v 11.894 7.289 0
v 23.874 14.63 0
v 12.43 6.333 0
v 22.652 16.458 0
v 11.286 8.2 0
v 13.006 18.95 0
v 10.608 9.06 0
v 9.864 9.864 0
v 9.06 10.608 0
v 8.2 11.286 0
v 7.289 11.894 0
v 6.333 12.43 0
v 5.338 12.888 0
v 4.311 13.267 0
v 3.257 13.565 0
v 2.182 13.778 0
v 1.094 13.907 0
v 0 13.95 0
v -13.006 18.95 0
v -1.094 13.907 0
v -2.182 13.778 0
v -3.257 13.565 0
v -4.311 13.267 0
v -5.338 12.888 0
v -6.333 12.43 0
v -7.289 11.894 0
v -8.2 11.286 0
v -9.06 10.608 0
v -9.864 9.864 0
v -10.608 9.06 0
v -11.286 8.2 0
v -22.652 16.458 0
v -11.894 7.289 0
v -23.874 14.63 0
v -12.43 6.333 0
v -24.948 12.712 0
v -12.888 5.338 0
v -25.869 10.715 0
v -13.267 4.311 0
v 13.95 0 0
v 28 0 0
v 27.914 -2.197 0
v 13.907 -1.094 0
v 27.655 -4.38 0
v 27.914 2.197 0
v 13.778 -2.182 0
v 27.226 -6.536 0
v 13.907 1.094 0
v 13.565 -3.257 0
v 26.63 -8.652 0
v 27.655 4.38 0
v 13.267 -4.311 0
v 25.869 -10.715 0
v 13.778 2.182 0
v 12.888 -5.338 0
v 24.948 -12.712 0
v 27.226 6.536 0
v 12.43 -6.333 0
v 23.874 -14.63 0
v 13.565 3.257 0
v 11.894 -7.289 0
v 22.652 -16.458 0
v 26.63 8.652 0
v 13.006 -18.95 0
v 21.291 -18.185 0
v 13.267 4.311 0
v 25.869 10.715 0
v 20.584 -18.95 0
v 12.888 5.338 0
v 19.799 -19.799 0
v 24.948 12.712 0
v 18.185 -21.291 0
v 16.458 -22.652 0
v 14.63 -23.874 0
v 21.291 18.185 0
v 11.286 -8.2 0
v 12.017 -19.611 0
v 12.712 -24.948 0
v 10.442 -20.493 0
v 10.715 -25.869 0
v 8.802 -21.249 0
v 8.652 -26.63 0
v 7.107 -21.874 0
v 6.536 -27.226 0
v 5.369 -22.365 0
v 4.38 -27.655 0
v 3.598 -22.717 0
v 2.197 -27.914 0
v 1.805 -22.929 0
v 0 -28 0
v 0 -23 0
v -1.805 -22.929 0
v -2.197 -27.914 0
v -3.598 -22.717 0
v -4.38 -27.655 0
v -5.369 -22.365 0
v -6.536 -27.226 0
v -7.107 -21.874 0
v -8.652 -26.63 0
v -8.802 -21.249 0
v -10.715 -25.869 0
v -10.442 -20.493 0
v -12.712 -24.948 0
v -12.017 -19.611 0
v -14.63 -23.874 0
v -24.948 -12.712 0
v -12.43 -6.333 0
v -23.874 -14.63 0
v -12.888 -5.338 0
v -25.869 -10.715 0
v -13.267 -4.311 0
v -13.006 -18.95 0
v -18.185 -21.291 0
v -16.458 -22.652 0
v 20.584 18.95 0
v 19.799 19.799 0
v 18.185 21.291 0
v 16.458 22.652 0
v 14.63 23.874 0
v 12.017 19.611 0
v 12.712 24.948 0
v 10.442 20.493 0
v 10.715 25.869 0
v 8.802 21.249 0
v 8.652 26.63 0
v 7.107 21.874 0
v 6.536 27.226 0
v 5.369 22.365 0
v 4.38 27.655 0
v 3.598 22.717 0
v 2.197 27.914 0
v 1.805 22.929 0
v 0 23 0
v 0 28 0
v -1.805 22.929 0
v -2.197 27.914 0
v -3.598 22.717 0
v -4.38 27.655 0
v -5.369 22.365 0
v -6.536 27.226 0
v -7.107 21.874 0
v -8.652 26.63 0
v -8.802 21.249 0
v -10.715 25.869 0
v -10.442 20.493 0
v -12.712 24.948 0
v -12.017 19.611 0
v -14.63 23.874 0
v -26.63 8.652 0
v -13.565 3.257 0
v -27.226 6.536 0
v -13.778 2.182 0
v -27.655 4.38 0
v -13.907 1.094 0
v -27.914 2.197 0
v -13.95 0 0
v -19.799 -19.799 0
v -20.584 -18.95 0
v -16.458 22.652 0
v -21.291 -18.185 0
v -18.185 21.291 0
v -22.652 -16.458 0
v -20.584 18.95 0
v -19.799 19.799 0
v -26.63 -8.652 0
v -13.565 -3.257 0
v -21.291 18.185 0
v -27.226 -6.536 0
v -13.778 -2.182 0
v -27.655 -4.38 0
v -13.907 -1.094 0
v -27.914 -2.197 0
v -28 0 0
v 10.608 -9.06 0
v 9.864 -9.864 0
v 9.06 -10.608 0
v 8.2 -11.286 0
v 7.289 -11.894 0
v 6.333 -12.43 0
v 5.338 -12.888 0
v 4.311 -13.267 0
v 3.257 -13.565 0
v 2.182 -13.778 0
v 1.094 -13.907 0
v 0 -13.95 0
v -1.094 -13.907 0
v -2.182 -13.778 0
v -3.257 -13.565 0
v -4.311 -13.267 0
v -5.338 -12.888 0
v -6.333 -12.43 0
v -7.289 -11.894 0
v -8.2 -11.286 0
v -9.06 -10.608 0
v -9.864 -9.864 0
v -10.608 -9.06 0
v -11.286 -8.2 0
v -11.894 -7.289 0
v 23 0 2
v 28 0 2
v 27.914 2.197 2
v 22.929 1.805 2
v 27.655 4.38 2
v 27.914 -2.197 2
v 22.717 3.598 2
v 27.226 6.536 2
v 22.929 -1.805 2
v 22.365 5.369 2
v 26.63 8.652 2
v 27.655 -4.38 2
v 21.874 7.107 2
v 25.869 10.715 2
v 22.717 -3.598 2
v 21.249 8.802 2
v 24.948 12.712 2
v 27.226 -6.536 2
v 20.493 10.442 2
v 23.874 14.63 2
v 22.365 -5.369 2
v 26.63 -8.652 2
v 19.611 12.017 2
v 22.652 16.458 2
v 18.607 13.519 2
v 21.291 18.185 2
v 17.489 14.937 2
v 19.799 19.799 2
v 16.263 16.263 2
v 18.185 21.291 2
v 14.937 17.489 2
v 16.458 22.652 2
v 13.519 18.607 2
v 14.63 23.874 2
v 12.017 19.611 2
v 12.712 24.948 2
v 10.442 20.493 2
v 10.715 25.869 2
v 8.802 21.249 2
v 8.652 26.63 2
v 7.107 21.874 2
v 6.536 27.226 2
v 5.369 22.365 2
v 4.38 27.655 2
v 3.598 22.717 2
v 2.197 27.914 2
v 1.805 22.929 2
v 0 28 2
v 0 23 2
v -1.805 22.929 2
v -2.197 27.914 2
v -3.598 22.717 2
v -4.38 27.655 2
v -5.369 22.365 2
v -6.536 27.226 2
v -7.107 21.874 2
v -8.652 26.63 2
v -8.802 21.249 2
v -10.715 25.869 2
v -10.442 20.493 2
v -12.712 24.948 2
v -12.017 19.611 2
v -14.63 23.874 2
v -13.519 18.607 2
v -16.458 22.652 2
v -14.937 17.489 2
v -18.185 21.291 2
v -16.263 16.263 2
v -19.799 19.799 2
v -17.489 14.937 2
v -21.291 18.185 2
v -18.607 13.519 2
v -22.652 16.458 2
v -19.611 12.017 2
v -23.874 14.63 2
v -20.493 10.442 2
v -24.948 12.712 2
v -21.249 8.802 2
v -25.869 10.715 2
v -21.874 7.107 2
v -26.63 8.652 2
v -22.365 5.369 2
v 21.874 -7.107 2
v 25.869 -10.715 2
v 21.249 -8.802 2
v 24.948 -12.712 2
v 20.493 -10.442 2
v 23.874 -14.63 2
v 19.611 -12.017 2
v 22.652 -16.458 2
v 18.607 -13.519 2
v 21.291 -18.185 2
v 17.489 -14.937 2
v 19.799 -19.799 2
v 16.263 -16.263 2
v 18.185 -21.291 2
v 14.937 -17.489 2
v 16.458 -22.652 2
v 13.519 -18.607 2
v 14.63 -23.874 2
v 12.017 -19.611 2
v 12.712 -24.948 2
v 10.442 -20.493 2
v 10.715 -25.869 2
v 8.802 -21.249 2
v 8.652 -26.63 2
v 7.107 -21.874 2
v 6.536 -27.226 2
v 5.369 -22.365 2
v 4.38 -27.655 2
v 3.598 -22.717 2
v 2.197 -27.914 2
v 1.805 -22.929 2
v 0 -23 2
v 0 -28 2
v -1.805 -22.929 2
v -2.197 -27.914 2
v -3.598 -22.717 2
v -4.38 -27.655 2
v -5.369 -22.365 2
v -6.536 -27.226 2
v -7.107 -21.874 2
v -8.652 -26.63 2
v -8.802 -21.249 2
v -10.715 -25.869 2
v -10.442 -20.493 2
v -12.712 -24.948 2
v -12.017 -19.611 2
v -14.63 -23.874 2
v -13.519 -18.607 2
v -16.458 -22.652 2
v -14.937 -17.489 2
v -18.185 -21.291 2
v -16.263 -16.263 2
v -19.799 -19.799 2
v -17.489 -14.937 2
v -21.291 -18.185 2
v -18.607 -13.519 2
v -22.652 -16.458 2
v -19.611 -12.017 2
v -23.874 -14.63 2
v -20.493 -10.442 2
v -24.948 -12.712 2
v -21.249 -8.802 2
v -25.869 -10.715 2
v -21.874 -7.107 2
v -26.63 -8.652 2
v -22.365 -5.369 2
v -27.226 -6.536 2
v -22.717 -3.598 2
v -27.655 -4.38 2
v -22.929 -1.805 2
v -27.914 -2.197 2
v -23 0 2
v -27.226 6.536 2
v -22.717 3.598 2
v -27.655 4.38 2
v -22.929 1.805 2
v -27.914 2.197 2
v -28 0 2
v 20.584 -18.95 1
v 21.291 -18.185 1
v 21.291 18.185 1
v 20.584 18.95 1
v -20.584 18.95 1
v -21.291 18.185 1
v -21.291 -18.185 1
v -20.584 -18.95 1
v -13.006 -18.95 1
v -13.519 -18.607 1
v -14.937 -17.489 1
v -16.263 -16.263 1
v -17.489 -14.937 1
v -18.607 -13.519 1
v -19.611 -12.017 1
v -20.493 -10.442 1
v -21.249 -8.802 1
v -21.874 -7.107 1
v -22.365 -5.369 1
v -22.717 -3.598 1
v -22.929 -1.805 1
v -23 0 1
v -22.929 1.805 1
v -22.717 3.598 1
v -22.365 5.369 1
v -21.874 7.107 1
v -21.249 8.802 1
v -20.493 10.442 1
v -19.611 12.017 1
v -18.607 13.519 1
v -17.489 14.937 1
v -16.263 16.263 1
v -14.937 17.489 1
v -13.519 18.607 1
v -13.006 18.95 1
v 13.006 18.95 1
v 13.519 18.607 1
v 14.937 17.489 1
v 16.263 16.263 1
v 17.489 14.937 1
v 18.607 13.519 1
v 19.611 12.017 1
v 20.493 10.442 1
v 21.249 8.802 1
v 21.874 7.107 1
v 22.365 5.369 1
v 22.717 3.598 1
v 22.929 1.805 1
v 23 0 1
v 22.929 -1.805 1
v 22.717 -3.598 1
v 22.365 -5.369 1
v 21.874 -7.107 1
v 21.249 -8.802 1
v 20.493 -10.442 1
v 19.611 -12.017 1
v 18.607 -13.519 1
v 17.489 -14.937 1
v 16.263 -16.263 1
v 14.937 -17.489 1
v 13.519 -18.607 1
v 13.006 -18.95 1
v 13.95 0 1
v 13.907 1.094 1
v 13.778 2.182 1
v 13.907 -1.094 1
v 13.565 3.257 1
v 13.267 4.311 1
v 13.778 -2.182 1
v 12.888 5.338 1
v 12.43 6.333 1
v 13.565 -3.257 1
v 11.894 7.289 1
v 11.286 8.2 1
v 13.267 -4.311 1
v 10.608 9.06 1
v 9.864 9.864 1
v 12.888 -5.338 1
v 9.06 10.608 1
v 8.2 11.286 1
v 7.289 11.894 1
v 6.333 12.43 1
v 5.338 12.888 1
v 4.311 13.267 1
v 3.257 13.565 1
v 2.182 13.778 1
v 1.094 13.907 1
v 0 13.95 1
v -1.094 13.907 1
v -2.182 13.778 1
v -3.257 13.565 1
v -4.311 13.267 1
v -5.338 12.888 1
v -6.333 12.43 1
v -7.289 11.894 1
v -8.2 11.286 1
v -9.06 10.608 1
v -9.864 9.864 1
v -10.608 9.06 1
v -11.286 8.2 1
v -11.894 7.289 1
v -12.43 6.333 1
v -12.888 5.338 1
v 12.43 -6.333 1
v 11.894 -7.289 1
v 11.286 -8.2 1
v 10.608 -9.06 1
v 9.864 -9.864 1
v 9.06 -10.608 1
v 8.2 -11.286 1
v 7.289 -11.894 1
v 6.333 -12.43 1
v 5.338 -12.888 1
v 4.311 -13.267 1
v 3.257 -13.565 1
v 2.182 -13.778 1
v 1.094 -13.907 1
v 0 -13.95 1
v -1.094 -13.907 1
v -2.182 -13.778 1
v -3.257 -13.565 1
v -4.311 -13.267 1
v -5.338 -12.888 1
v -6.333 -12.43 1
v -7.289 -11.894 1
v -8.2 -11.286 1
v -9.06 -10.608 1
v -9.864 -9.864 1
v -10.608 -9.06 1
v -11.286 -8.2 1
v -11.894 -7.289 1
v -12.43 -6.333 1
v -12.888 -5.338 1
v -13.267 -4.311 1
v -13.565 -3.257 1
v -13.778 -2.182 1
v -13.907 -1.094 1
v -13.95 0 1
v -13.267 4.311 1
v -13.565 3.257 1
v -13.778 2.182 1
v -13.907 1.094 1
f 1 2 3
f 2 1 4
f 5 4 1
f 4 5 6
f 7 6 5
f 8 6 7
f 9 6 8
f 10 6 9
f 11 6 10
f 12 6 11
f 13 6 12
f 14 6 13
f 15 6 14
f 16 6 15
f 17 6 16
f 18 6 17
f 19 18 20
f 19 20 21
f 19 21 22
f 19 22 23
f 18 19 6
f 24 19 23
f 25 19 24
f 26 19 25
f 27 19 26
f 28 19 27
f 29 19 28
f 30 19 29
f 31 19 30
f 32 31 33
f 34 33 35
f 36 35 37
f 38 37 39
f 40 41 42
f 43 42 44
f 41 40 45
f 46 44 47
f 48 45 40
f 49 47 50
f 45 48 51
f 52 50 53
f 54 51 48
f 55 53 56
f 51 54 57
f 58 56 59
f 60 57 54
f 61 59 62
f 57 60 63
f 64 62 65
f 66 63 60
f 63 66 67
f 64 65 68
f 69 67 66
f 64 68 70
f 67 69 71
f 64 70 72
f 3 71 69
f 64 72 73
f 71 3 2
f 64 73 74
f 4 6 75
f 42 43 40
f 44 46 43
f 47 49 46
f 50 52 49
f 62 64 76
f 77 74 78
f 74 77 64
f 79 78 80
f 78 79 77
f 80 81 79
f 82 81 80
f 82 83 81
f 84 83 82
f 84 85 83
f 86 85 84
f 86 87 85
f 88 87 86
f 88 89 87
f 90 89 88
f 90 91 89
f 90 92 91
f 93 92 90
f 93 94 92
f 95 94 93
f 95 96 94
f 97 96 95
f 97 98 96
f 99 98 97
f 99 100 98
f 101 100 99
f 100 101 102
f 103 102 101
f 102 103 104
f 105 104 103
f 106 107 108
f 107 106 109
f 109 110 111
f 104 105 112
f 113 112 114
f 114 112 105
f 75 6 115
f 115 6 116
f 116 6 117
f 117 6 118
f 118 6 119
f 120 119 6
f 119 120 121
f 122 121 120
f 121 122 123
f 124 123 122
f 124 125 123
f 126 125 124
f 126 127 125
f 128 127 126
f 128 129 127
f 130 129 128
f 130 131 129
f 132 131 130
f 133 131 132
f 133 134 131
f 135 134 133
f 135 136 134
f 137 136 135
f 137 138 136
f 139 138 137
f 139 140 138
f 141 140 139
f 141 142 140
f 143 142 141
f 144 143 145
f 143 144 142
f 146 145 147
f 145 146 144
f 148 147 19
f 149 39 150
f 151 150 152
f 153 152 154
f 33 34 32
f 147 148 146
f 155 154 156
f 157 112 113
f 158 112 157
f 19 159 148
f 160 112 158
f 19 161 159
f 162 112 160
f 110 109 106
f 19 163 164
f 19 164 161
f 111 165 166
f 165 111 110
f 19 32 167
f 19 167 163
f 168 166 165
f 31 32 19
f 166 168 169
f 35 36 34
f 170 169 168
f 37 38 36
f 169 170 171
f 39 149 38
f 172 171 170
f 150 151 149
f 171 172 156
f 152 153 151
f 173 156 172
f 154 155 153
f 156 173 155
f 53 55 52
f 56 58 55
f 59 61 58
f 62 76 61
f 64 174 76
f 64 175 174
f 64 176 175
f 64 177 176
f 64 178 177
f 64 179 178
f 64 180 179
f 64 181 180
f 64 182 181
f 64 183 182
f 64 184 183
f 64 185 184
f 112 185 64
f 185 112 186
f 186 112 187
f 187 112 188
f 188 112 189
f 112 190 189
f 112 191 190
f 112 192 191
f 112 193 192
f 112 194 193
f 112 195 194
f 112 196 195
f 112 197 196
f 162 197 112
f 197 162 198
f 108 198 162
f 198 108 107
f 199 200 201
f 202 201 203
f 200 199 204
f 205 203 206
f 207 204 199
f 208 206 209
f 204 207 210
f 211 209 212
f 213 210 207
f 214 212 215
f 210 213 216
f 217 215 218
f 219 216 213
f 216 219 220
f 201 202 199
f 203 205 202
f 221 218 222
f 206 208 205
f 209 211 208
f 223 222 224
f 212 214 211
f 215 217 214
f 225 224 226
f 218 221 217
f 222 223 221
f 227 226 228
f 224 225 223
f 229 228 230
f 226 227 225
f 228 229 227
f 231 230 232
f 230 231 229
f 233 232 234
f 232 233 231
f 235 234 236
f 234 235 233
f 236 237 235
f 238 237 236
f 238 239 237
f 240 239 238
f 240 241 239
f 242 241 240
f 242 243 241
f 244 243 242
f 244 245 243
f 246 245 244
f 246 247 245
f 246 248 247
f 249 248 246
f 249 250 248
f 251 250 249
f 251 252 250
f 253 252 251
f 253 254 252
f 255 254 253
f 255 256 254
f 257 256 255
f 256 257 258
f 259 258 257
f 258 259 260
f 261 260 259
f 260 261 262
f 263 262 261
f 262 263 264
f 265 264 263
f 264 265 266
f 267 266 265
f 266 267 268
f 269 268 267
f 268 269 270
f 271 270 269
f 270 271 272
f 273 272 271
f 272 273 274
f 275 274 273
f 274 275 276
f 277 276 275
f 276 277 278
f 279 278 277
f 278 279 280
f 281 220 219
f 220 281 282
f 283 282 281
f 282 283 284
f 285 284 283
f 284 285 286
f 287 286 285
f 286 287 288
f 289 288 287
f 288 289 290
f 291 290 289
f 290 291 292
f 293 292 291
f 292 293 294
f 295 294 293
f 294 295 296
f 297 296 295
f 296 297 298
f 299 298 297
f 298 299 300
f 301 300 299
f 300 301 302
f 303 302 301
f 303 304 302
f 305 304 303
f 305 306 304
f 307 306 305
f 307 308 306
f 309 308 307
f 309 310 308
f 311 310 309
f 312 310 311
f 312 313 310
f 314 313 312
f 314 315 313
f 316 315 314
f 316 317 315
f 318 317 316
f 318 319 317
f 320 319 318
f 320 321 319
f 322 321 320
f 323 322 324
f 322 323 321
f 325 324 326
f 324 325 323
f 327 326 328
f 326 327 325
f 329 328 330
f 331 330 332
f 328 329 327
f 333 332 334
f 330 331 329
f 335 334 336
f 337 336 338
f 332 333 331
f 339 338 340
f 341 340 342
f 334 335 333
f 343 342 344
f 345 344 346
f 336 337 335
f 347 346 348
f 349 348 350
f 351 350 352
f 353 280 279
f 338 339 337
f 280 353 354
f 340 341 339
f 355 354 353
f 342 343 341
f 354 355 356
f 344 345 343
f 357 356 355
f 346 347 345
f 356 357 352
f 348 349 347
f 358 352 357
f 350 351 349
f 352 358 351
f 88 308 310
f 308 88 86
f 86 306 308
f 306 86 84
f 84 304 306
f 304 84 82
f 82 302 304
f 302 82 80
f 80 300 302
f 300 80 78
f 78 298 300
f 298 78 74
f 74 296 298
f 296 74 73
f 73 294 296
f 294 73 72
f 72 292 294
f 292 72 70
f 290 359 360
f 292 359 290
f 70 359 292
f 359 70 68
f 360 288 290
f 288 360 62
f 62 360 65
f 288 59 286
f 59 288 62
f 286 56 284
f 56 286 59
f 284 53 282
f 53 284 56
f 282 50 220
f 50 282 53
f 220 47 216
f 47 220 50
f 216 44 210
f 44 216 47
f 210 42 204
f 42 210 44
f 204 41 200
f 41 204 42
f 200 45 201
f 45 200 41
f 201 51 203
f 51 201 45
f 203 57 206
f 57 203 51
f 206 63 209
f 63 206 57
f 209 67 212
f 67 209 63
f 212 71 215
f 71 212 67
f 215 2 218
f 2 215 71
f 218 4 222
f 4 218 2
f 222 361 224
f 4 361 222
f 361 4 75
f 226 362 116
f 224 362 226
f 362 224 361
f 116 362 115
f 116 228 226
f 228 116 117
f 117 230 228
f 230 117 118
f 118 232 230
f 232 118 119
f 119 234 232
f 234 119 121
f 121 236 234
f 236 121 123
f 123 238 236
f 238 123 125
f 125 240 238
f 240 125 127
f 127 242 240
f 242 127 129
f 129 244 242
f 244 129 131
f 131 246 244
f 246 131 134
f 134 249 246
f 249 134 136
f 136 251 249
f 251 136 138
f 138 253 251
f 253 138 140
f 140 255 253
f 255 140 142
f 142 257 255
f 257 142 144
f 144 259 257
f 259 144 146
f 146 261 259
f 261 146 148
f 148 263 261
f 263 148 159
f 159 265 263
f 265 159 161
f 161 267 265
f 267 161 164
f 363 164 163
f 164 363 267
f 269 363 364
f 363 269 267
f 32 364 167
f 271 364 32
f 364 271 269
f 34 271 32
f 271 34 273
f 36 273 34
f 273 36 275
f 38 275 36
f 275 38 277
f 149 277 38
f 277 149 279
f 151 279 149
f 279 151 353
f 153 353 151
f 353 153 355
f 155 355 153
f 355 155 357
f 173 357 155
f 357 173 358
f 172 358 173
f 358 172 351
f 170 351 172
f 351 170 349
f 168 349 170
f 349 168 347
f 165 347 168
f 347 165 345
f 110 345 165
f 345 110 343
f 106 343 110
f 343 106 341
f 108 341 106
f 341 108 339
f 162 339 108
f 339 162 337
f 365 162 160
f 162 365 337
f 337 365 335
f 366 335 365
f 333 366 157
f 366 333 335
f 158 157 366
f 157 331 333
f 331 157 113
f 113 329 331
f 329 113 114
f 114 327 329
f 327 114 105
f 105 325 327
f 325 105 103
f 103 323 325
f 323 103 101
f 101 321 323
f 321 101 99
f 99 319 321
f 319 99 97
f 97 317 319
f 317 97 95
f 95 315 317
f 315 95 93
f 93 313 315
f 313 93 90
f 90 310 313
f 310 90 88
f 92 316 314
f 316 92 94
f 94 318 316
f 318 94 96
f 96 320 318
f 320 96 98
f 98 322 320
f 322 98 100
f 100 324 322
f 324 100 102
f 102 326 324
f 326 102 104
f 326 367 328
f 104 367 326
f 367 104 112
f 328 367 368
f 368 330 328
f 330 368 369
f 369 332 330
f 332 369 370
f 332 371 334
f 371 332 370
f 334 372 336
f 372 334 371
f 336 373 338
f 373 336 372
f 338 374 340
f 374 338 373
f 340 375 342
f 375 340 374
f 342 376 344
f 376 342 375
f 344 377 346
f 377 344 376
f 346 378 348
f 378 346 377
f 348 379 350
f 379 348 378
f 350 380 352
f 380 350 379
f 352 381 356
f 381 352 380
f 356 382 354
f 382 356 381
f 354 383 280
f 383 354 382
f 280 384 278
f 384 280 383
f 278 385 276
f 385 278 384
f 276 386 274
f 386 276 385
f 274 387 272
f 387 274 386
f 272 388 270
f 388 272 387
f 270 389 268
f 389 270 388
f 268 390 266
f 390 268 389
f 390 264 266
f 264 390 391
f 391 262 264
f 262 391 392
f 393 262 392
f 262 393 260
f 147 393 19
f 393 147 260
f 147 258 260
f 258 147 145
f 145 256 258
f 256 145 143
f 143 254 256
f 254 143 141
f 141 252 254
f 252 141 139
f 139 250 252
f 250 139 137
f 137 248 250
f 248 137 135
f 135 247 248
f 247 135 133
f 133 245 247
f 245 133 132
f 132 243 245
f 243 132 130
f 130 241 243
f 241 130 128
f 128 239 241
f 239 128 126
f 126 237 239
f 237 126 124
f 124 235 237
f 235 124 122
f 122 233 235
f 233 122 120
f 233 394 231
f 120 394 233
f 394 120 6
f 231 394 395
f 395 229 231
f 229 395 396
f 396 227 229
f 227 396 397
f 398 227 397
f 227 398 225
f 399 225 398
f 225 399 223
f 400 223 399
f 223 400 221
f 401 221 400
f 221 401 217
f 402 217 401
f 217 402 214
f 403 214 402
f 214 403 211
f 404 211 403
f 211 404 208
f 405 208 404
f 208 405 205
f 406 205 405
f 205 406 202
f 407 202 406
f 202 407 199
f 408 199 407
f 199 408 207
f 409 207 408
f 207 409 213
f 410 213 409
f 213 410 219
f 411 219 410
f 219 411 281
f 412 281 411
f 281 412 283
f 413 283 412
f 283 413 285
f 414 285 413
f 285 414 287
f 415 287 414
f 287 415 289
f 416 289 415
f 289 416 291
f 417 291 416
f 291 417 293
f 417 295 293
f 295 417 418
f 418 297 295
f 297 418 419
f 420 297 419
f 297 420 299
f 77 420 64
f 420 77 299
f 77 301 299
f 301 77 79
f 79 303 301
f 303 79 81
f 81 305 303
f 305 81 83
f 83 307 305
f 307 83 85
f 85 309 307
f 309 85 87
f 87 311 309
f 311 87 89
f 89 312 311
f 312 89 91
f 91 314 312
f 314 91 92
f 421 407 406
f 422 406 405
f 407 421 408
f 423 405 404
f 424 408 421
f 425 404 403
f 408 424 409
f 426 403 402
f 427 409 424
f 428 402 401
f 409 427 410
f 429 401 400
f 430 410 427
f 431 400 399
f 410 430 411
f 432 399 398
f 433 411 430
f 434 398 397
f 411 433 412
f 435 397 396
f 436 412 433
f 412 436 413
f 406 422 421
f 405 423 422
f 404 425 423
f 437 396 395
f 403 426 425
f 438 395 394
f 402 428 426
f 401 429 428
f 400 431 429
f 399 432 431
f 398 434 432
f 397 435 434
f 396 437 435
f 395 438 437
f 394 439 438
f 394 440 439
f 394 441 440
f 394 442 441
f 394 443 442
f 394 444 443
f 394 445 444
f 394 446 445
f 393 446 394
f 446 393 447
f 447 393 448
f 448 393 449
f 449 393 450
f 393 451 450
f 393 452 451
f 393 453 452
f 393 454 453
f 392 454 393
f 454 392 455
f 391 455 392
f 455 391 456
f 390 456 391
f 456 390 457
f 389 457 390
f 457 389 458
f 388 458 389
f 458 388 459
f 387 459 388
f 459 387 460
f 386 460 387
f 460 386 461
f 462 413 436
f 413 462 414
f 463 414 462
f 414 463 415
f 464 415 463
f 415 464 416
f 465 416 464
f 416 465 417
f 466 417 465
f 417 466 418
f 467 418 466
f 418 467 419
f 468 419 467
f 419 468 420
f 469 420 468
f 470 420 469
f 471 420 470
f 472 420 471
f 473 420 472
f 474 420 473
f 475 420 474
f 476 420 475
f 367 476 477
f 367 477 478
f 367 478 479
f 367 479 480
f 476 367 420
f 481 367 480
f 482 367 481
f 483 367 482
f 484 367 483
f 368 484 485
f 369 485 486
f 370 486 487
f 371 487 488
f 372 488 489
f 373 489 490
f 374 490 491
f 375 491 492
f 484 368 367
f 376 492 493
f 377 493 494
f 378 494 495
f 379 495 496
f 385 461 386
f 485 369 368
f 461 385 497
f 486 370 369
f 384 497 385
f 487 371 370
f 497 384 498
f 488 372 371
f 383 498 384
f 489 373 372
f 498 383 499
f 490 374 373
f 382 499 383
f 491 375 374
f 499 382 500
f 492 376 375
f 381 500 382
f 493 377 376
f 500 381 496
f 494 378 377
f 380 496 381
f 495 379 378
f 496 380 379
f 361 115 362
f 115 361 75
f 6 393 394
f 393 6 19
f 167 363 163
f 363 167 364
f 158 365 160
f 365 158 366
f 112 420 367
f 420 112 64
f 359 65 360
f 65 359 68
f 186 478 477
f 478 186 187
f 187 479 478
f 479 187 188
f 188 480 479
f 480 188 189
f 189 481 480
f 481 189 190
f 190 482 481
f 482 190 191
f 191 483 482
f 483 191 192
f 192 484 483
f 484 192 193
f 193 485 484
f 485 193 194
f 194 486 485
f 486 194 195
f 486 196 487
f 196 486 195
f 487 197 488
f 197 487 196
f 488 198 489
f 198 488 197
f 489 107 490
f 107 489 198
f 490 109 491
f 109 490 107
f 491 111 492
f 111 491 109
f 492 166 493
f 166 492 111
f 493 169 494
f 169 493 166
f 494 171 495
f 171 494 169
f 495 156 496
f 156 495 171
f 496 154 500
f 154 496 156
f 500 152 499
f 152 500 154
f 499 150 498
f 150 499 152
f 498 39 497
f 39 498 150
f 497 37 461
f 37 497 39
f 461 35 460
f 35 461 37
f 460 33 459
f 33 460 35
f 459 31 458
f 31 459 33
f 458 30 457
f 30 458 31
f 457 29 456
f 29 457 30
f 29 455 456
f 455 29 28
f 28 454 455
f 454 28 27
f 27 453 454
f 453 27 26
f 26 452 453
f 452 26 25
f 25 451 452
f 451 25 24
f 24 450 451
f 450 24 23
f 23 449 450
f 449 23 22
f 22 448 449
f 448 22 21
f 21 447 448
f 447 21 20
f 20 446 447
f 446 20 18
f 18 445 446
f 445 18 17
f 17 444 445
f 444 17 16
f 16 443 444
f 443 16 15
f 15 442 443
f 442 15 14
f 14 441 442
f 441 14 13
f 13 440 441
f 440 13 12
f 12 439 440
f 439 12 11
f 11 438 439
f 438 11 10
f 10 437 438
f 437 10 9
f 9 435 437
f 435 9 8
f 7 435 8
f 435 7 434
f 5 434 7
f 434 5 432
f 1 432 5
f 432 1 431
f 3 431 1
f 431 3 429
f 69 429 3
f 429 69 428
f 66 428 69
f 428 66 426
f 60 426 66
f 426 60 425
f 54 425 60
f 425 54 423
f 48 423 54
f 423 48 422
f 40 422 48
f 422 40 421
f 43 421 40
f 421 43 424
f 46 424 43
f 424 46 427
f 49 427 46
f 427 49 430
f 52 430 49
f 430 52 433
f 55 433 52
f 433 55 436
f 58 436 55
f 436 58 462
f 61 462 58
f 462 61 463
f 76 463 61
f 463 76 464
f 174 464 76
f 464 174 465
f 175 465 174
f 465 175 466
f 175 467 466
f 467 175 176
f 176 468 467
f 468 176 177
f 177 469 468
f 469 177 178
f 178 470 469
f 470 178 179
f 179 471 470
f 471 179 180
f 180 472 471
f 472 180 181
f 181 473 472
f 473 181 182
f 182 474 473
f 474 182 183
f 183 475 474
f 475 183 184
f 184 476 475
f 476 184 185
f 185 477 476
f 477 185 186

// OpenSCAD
$fn = 80;

inner_id = 27.9;
outer_id = 46;
lap = 5;
inner_od = outer_id + lap*2;

module inner_2d() {
  intersection() {
    difference() {
      circle(d=inner_od);
      circle(d=inner_id);
    }
    square([1000, inner_id+10], center=true);
  }
}

module outer_2d() {
  difference() {
    circle(d=outer_id+10);
    circle(d=outer_id);
  }
}

module inner() {
  linear_extrude(7.2)
    inner_2d();
}

color("blue") linear_extrude(2) outer_2d();
color("red") linear_extrude(1) inner_2d();
